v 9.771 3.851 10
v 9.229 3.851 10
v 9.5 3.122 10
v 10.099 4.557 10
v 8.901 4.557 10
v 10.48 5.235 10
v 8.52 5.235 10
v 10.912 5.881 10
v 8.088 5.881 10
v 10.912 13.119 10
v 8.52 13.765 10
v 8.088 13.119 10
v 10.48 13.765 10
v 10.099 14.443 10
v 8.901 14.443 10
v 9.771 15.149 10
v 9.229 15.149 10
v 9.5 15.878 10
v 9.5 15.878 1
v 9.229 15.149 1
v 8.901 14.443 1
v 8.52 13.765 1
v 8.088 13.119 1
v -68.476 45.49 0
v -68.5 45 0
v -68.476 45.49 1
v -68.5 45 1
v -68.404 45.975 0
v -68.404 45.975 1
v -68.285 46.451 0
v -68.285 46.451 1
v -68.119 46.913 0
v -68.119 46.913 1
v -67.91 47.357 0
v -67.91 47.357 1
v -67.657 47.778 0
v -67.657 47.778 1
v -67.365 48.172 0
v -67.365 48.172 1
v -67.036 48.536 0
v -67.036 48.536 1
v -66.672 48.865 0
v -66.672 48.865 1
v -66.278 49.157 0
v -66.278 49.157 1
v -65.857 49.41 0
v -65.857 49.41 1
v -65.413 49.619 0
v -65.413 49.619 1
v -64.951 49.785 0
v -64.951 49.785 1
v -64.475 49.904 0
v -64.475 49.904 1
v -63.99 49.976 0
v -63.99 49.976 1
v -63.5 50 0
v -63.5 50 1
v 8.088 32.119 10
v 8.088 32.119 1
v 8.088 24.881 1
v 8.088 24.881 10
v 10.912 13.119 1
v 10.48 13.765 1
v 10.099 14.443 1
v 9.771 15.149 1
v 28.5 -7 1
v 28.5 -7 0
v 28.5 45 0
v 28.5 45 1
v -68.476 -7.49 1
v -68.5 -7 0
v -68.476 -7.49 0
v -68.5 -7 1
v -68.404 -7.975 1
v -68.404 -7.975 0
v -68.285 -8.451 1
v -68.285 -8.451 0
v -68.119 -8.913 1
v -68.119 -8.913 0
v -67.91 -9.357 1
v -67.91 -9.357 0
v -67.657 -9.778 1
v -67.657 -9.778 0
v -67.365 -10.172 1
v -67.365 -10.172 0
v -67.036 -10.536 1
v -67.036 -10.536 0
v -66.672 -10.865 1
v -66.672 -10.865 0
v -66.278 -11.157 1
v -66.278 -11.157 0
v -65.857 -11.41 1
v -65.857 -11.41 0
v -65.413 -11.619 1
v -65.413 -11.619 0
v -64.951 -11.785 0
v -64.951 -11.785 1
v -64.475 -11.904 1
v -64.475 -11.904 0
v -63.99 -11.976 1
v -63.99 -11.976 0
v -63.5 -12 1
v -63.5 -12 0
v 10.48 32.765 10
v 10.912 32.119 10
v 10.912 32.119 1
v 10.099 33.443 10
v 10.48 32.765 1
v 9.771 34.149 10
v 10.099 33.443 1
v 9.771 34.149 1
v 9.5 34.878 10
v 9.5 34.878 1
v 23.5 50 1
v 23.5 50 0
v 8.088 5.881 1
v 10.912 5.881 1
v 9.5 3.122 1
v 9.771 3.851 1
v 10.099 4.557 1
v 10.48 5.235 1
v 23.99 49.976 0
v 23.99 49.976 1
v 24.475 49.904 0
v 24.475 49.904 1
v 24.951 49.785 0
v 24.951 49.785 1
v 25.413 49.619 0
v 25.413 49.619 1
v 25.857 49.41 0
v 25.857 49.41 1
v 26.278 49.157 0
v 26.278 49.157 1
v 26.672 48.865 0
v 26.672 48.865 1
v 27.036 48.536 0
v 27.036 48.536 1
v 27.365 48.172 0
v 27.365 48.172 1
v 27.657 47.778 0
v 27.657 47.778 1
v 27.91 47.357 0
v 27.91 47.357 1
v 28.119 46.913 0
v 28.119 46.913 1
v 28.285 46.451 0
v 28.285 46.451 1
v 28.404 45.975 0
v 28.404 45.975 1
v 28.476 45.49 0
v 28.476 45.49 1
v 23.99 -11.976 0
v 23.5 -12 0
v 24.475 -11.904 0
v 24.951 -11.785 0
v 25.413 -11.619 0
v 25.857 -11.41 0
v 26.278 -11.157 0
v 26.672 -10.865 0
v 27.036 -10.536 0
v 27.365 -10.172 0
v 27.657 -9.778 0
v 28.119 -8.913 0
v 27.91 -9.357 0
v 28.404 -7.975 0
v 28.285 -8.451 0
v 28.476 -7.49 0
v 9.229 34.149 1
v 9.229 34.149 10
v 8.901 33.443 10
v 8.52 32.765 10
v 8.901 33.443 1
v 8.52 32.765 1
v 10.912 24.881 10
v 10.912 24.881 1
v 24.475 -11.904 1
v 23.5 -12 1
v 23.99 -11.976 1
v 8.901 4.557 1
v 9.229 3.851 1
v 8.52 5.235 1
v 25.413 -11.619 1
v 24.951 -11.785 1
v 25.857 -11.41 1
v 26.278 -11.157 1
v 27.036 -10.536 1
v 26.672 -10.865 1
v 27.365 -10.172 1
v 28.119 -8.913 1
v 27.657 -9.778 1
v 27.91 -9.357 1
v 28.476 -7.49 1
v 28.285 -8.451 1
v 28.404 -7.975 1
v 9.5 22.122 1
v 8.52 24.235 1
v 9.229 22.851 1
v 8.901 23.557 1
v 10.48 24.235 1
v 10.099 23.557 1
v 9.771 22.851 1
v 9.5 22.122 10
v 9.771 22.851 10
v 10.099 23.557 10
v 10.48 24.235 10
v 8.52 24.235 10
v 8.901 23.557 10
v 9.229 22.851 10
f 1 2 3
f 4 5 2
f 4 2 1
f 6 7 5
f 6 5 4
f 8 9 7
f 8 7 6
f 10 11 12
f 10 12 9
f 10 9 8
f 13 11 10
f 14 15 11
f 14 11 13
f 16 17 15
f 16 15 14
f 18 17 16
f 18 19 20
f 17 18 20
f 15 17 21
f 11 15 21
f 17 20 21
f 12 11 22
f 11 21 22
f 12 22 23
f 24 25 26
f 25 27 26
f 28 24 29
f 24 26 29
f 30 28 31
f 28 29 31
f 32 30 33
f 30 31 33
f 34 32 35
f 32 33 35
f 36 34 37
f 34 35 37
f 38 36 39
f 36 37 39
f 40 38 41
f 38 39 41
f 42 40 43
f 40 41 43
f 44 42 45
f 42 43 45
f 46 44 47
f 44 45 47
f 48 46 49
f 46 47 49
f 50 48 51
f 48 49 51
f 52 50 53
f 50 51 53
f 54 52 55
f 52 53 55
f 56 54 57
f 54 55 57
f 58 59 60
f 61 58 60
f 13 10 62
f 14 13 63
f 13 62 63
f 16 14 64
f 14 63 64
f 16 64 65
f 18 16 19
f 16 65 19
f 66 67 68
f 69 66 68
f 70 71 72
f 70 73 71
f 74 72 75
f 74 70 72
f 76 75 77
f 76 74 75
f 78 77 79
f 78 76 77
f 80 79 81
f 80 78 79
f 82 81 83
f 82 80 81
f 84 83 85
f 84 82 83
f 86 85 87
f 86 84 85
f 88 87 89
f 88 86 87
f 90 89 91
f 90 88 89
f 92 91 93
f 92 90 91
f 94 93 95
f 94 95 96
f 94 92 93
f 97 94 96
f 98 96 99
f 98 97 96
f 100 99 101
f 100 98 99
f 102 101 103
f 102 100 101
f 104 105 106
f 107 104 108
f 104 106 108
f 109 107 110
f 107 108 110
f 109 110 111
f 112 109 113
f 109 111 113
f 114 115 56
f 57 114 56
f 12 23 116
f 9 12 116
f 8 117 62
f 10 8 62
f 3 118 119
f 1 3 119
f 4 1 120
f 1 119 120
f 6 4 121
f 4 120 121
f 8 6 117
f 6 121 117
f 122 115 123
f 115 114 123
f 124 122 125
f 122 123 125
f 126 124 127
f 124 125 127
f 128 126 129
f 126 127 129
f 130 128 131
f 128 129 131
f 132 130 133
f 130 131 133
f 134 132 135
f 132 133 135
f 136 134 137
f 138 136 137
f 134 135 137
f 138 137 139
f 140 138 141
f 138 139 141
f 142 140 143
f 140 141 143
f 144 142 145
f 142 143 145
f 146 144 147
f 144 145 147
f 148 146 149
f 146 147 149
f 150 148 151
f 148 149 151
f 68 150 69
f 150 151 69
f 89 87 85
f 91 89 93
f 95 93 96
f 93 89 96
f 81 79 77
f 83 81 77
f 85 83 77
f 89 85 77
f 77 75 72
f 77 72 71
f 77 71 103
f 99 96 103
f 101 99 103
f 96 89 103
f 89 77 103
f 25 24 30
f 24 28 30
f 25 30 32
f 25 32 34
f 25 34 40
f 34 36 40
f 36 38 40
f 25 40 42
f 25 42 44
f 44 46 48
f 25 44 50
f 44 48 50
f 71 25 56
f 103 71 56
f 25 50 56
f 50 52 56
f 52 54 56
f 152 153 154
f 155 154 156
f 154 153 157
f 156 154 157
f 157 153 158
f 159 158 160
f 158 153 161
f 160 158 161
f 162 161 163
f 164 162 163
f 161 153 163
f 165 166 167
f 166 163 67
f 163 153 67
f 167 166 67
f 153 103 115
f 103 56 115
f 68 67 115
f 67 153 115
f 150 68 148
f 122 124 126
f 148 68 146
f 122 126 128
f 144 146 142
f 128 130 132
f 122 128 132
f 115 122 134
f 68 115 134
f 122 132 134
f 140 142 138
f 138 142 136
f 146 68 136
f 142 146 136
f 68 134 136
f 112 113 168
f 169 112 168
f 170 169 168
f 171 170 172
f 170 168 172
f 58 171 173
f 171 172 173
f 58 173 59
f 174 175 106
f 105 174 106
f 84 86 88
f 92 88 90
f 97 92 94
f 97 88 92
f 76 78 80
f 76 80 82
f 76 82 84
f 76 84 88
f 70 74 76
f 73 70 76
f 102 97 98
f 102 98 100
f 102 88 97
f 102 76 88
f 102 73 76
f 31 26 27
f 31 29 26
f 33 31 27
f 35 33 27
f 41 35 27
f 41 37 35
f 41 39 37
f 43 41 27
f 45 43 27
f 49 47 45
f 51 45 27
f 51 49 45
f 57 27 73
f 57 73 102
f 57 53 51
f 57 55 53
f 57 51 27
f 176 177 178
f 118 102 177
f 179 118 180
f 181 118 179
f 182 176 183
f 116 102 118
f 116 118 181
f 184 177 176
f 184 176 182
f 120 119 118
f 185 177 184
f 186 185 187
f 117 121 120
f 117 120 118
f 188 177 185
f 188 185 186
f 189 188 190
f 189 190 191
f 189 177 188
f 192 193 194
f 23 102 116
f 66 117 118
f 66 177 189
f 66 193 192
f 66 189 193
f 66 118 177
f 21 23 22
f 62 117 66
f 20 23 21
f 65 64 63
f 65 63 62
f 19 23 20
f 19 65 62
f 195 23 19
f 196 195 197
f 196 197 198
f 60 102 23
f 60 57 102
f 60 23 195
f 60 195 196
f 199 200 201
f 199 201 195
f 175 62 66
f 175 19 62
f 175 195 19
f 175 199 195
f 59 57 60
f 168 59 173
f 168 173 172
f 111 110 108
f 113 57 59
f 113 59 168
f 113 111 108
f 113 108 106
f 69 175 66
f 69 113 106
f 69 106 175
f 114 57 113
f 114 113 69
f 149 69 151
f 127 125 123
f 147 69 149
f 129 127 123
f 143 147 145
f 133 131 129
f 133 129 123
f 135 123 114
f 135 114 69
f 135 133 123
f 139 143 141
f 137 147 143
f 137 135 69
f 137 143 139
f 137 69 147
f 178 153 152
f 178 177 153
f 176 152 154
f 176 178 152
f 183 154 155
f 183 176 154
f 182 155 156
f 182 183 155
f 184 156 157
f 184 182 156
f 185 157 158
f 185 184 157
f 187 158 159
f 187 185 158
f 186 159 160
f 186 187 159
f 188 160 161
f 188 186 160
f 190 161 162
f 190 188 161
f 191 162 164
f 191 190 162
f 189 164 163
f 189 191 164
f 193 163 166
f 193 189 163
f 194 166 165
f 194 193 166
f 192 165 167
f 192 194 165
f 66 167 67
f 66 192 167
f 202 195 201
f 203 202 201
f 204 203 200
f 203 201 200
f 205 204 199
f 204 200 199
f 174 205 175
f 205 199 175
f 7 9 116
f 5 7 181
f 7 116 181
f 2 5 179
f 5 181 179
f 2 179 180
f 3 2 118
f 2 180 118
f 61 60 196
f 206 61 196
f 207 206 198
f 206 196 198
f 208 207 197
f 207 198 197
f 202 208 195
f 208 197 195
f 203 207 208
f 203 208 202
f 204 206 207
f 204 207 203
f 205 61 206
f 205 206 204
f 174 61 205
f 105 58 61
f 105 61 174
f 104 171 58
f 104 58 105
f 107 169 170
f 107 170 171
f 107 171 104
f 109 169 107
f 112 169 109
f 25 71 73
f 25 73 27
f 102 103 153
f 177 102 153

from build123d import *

# Parameters (mm, degrees)
F0_W     = 59
F0_H     = 62
F0_W_2   = 38
F1_DEPTH = 1
F2_DEPTH = 10
F3_R     = 5


# Not quite as in the source:
# - a feature names something its author has since deleted; it is built from what else it names


with BuildPart() as f1:
    # F0 (on Top) → F1 (new body)
    with BuildSketch(Plane.XY):
        with Locations((-39, 19)):
            Rectangle(F0_W, F0_H)
        with Locations((9.5, 19)):
            Rectangle(F0_W_2, F0_H)
        with BuildLine():
            ThreePointArc((9.5, 15.8775010008), (10.0985618966, 14.4432029131), (10.9121369044, 13.1189736826))
            Line((10.9121369044, 13.1189736826), (10.9121369044, 5.8810263174))
            ThreePointArc((10.9121369044, 5.8810263174), (10.0985618966, 4.5567970869), (9.5, 3.1224989992))
            ThreePointArc((9.5, 3.1224989992), (8.9014381034, 4.5567970869), (8.0878630956, 5.8810263174))
            Line((8.0878630956, 5.8810263174), (8.0878630956, 13.1189736826))
            ThreePointArc((8.0878630956, 13.1189736826), (8.9014381034, 14.4432029131), (9.5, 15.8775010008))
        make_face(mode=Mode.SUBTRACT)
        with BuildLine():
            Line((8.0878630956, 24.8810263174), (8.0878630956, 32.1189736826))
            ThreePointArc((8.0878630956, 32.1189736826), (8.9014381034, 33.4432029131), (9.5, 34.8775010008))
            ThreePointArc((9.5, 34.8775010008), (10.0985618966, 33.4432029131), (10.9121369044, 32.1189736826))
            Line((10.9121369044, 32.1189736826), (10.9121369044, 24.8810263174))
            ThreePointArc((10.9121369044, 24.8810263174), (10.0985618966, 23.5567970869), (9.5, 22.1224989992))
            ThreePointArc((9.5, 22.1224989992), (8.9014381034, 23.5567970869), (8.0878630956, 24.8810263174))
        make_face(mode=Mode.SUBTRACT)
    extrude(amount=F1_DEPTH)

    # F0 (on Top) → F2 (join)
    with BuildSketch(Plane.XY):
        with BuildLine():
            ThreePointArc((9.5, 34.8775010008), (8.9014381034, 33.4432029131), (8.0878630956, 32.1189736826))
            Line((8.0878630956, 32.1189736826), (8.0878630956, 24.8810263174))
            ThreePointArc((8.0878630956, 24.8810263174), (8.9014381034, 23.5567970869), (9.5, 22.1224989992))
            ThreePointArc((9.5, 22.1224989992), (10.0985618966, 23.5567970869), (10.9121369044, 24.8810263174))
            Line((10.9121369044, 24.8810263174), (10.9121369044, 32.1189736826))
            ThreePointArc((10.9121369044, 32.1189736826), (10.0985618966, 33.4432029131), (9.5, 34.8775010008))
        make_face()
        with BuildLine():
            Line((10.9121369044, 5.8810263174), (10.9121369044, 13.1189736826))
            ThreePointArc((10.9121369044, 13.1189736826), (10.0985618966, 14.4432029131), (9.5, 15.8775010008))
            ThreePointArc((9.5, 15.8775010008), (8.9014381034, 14.4432029131), (8.0878630956, 13.1189736826))
            Line((8.0878630956, 13.1189736826), (8.0878630956, 5.8810263174))
            ThreePointArc((8.0878630956, 5.8810263174), (8.9014381034, 4.5567970869), (9.5, 3.1224989992))
            ThreePointArc((9.5, 3.1224989992), (10.0985618966, 4.5567970869), (10.9121369044, 5.8810263174))
        make_face()
    extrude(amount=F2_DEPTH)

    # F3
    f3_edges = [f1.edges().sort_by_distance(p)[0] for p in [
        (-68.5, 50, 0.5),
        (28.5, 50, 0.5),
        (28.5, -12, 0.5),
        (-68.5, -12, 0.5),
    ]]
    fillet(f3_edges, radius=F3_R)


solid = f1.part
